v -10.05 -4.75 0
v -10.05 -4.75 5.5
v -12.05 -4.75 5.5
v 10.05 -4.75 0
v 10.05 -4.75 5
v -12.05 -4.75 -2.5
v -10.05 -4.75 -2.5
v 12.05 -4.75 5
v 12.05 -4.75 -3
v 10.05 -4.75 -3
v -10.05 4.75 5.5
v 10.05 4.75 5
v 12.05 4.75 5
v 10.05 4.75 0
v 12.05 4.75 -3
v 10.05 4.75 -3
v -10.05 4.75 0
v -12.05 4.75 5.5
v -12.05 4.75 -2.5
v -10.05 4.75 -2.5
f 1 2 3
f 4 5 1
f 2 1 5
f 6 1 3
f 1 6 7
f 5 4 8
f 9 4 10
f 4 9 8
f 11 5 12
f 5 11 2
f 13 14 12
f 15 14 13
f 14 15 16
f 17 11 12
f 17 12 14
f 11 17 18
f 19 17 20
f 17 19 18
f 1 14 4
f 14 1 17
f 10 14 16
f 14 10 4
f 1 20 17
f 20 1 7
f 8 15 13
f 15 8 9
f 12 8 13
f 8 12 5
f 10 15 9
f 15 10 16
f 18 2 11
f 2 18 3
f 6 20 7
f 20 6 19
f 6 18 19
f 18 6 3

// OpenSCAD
height=20.1;
wedge_z1 = 0;
wedge_z2 = 5.5;
wedge_z3 = 5;
wedge_y = 10-0.5;
foot_z = 8;

module wedge() {
    polyhedron(
        points=[
                [-height/2,-wedge_y/2, wedge_z1],
                [-height/2,-wedge_y/2, wedge_z2],
                [height/2,-wedge_y/2, wedge_z3],
                [height/2,-wedge_y/2, wedge_z1],
                [-height/2,wedge_y/2, wedge_z1],
                [-height/2,wedge_y/2, wedge_z2],
                [height/2,wedge_y/2, wedge_z3],
                [height/2,wedge_y/2, wedge_z1],
              ],
        faces =[
                [0,3,2,1],
                [1,2,6,5],
                [5,6,7,4],
                [4,7,3,0],
                [6,2,3,7],
                [0,1,5,4],
            
    ]);
}

wedge();
translate([height/2, -wedge_y/2, -foot_z + wedge_z3]) cube([2, wedge_y, foot_z]);
translate([-height/2-2, -wedge_y/2, -foot_z + wedge_z2]) cube([2, wedge_y, foot_z]);
